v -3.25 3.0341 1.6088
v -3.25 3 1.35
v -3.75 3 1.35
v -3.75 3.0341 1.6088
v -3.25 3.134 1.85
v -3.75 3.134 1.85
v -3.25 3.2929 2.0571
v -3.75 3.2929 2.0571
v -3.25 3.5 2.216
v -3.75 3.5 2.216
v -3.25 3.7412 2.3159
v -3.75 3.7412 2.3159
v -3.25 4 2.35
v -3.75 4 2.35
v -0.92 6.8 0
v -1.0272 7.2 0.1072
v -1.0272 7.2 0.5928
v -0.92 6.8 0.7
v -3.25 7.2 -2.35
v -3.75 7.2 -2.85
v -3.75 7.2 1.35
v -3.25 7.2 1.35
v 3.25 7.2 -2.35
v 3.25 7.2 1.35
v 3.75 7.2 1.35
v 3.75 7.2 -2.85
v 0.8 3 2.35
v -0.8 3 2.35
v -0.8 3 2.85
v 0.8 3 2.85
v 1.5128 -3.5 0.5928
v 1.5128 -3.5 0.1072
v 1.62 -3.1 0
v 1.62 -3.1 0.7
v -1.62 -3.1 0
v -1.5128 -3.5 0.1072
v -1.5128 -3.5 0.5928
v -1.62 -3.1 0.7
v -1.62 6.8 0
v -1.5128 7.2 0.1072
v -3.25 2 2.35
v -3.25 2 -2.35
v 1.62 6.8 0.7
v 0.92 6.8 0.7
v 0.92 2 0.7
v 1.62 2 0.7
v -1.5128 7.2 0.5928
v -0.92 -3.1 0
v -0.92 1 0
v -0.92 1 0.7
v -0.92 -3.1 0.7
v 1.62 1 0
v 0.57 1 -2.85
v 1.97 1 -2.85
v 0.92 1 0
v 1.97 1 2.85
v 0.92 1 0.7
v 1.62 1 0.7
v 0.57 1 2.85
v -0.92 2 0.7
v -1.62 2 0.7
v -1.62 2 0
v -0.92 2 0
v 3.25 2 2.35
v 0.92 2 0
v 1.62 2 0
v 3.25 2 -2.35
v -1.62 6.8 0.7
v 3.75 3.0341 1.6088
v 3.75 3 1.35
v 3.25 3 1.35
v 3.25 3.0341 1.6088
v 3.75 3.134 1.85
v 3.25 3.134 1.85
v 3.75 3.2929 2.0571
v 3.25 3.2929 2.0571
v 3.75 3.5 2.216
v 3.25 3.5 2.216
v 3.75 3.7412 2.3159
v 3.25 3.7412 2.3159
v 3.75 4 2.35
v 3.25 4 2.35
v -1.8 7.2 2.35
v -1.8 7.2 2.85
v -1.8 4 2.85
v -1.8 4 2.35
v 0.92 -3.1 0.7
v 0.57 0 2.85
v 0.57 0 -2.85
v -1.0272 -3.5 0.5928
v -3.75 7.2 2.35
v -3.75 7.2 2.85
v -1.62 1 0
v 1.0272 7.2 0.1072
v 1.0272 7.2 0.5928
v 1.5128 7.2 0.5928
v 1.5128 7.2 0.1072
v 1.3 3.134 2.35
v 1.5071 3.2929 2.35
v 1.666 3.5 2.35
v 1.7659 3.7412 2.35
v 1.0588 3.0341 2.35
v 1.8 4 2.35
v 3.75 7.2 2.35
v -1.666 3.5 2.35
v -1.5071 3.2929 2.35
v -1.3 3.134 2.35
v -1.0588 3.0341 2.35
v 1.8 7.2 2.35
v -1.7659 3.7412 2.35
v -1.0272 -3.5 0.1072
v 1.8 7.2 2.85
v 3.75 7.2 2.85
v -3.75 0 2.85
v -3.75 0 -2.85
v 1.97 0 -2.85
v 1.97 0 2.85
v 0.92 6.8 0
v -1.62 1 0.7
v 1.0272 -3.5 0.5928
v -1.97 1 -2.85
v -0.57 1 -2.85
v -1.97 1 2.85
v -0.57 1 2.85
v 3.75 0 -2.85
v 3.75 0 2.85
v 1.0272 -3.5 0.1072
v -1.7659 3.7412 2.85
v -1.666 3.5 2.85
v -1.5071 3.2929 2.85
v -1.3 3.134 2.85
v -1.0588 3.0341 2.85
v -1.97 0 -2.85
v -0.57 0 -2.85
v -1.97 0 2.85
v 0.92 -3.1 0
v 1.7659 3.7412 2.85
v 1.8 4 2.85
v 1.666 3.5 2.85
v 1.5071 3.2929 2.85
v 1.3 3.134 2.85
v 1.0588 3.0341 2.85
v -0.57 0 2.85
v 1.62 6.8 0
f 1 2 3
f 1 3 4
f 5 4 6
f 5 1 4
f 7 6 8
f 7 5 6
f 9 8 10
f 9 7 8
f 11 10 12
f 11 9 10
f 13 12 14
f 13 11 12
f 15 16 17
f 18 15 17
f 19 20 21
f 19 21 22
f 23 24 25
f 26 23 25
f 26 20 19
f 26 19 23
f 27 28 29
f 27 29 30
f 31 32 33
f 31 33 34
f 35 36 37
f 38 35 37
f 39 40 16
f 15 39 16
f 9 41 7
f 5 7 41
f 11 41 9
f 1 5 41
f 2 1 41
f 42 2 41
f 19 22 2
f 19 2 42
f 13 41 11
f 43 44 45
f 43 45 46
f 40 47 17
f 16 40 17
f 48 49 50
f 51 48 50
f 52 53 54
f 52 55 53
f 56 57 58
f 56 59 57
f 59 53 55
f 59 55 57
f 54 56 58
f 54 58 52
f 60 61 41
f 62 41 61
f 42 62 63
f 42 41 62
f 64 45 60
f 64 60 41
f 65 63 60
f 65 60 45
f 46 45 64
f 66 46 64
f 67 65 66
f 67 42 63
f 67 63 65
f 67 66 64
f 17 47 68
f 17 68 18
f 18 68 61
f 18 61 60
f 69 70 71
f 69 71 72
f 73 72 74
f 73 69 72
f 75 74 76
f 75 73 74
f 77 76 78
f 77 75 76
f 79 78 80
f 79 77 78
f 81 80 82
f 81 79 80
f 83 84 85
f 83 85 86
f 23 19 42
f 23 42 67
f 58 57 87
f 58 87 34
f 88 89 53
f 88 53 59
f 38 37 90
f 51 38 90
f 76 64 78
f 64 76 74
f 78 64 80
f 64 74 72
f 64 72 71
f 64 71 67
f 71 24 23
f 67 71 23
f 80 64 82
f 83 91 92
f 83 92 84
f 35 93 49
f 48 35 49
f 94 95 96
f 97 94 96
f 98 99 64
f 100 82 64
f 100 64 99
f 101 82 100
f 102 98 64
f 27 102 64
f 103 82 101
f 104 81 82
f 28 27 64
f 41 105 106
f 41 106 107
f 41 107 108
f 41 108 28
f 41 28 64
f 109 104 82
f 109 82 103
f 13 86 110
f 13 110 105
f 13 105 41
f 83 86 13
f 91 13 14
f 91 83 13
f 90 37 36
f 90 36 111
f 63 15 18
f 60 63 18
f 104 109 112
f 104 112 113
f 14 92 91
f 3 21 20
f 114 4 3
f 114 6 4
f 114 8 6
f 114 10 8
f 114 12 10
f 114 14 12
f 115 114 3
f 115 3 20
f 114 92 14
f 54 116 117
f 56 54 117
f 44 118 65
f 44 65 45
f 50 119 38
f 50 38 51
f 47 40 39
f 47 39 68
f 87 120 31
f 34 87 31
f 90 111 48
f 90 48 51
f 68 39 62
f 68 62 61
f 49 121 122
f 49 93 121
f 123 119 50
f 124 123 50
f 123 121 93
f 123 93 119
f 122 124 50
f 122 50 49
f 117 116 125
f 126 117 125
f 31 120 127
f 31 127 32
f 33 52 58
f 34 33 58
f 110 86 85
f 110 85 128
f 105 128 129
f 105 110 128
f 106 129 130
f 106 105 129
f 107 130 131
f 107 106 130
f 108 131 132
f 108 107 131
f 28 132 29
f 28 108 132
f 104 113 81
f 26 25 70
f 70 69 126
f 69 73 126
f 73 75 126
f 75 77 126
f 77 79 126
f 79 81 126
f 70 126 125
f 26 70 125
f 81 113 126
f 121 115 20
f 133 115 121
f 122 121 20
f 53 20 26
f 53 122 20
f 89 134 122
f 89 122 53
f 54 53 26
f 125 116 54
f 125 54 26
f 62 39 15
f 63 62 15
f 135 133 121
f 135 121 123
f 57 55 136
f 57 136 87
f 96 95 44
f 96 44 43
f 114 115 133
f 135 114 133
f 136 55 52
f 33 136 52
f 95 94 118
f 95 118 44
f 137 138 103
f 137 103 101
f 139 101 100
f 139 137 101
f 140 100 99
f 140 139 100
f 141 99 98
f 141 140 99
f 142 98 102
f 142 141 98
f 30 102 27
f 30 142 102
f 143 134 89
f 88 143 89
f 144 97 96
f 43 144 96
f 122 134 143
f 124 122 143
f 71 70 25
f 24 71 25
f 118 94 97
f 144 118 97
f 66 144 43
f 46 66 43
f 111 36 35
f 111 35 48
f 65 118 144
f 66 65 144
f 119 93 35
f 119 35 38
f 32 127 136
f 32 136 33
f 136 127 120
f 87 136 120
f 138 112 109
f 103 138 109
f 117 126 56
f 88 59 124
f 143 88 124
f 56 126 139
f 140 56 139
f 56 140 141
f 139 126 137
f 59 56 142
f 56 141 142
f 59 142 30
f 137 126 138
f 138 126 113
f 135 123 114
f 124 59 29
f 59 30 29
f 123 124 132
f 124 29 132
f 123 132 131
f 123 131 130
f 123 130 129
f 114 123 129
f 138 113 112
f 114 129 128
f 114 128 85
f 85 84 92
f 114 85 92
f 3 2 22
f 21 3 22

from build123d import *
from OCP.BRepFilletAPI import BRepFilletAPI_MakeChamfer

# Parameters (mm, degrees)
CROQUIS2_W              = 7.5
CROQUIS2_H              = 5.7
SALIENTE_EXTRUIR1_DEPTH = 7.2
CROQUIS3_W              = 6.5
CROQUIS3_H              = 4.7
CORTAR_EXTRUIR1_DEPTH   = 5.2
CROQUIS4_W              = 3.6
CROQUIS4_H              = 0.5
CORTAR_EXTRUIR2_DEPTH   = 4.2
CROQUIS5_W              = 1
CROQUIS5_H              = 4.2
CORTAR_EXTRUIR3_DEPTH   = 11.780190165
REDONDEO1_R             = 1
CROQUIS7_W              = 1.4
CROQUIS7_H              = 5.7
CORTAR_EXTRUIR4_DEPTH   = 1
SALIENTE_EXTRUIR2_START = -7.2
CROQUIS6_W              = 0.7
CROQUIS6_H              = 0.7
SALIENTE_EXTRUIR2_DEPTH = 10.7
CHAFL_N1_SIZE           = 0.4
CHAFL_N1_SIZE2          = 0.107179677
CHAFL_N2_SIZE           = 0.4
CHAFL_N2_SIZE2          = 0.107179677
CHAFL_N3_SIZE           = 0.4
CHAFL_N3_SIZE2          = 0.107179677


with BuildPart() as part:
    # Croquis2 → Saliente-Extruir1 (new body)
    with BuildSketch(Plane(origin=(0, 0, 0), x_dir=(1, 0, 0), z_dir=(0, 1, 0))):
        Rectangle(CROQUIS2_W, CROQUIS2_H)
    extrude(amount=SALIENTE_EXTRUIR1_DEPTH)

    # Croquis3 → Cortar-Extruir1 (cut)
    with BuildSketch(Plane(origin=(0, 7.2, 0), x_dir=(1, 0, 0), z_dir=(0, 1, 0))):
        Rectangle(CROQUIS3_W, CROQUIS3_H)
    extrude(amount=-CORTAR_EXTRUIR1_DEPTH, mode=Mode.SUBTRACT)

    # Croquis4 → Cortar-Extruir2 (cut)
    with BuildSketch(Plane(origin=(0, 7.2, 0), x_dir=(1, 0, 0), z_dir=(0, 1, 0))):
        with Locations((0, -2.6)):
            Rectangle(CROQUIS4_W, CROQUIS4_H)
    extrude(amount=-CORTAR_EXTRUIR2_DEPTH, mode=Mode.SUBTRACT)

    # Croquis5 → Cortar-Extruir3 (cut, through all)
    with BuildSketch(Plane(origin=(3.75, 0, 0), x_dir=(0, 0, -1), z_dir=(1, 0, 0))):
        with Locations((-1.85, 5.1)):
            Rectangle(CROQUIS5_W, CROQUIS5_H)
    extrude(amount=-CORTAR_EXTRUIR3_DEPTH, mode=Mode.SUBTRACT)

    # Redondeo1
    # the kernel refuses this fillet: 1 mm, written as the material it adds along each edge
    with BuildSketch(Plane(origin=(1.8, 3, 2.85), x_dir=(0, 1, 0), z_dir=(0, 0, -1)), Plane(origin=(3.75, 3, 2.35), x_dir=(0, 0, -1), z_dir=(-1, 0, 0))) as redondeo1_piece_1:
        with BuildLine():
            CenterArc((REDONDEO1_R, -REDONDEO1_R), REDONDEO1_R, 90, 90)
            Line((0, -REDONDEO1_R), (0, 0))
            Line((0, 0), (REDONDEO1_R, 0))
        make_face()
    extrude(amount=0.5)
    with BuildSketch(Plane(origin=(-1.8, 3, 2.35), x_dir=(1, 0, 0), z_dir=(0, 0, 1)), Plane(origin=(-3.25, 3, 2.35), x_dir=(0, 1, 0), z_dir=(-1, 0, 0))) as redondeo1_piece_2:
        with BuildLine():
            CenterArc((REDONDEO1_R, REDONDEO1_R), REDONDEO1_R, 180, 90)
            Line((0, REDONDEO1_R), (0, 0))
            Line((0, 0), (REDONDEO1_R, 0))
        make_face()
    extrude(amount=0.5)

    # Croquis7 → Cortar-Extruir4 (cut)
    with BuildSketch(Plane.XZ):
        with Locations((-1.27, 0)):
            Rectangle(CROQUIS7_W, CROQUIS7_H)
        with Locations((1.27, 0)):
            Rectangle(CROQUIS7_W, CROQUIS7_H)
    extrude(amount=-CORTAR_EXTRUIR4_DEPTH, mode=Mode.SUBTRACT)

    # Croquis6 → Saliente-Extruir2 (add)
    with BuildSketch(Plane.XZ.offset(SALIENTE_EXTRUIR2_START)):
        with Locations((-1.27, 0.35)):
            Rectangle(CROQUIS6_W, CROQUIS6_H)
        with Locations((1.27, 0.35)):
            Rectangle(CROQUIS6_W, CROQUIS6_H)
    extrude(amount=SALIENTE_EXTRUIR2_DEPTH)

    # Chaflán1: one chamfer whose edges measure the first distance from different faces: ONE call of the kernel's chamfer builder (chamfer() names one face for all edges)
    chafl_n1_edges_1 = [part.edges().sort_by_distance(p)[0] for p in [
        (-0.92, -3.5, 0.35),
    ]]
    chafl_n1_side_1 = [part.faces().sort_by_distance(p)[0] for p in [
        (-0.92, -1.25, 0.35),
    ]]
    chafl_n1_edges_2 = [part.edges().sort_by_distance(p)[0] for p in [
        (-1.27, -3.5, 0.7),
    ]]
    chafl_n1_side_2 = [part.faces().sort_by_distance(p)[0] for p in [
        (-1.27, -1.25, 0.7),
    ]]
    chafl_n1_edges_3 = [part.edges().sort_by_distance(p)[0] for p in [
        (-1.62, -3.5, 0.35),
    ]]
    chafl_n1_side_3 = [part.faces().sort_by_distance(p)[0] for p in [
        (-1.62, -1.25, 0.35),
    ]]
    chafl_n1_edges_4 = [part.edges().sort_by_distance(p)[0] for p in [
        (-1.27, -3.5, 0),
    ]]
    chafl_n1_side_4 = [part.faces().sort_by_distance(p)[0] for p in [
        (-1.27, -1.25, 0),
    ]]
    chafl_n1_edges_5 = [part.edges().sort_by_distance(p)[0] for p in [
        (1.62, -3.5, 0.35),
    ]]
    chafl_n1_side_5 = [part.faces().sort_by_distance(p)[0] for p in [
        (1.62, -1.25, 0.35),
    ]]
    chafl_n1_edges_6 = [part.edges().sort_by_distance(p)[0] for p in [
        (1.27, -3.5, 0.7),
    ]]
    chafl_n1_side_6 = [part.faces().sort_by_distance(p)[0] for p in [
        (1.27, -1.25, 0.7),
    ]]
    chafl_n1_edges_7 = [part.edges().sort_by_distance(p)[0] for p in [
        (0.92, -3.5, 0.35),
    ]]
    chafl_n1_side_7 = [part.faces().sort_by_distance(p)[0] for p in [
        (0.92, -1.25, 0.35),
    ]]
    chafl_n1_edges_8 = [part.edges().sort_by_distance(p)[0] for p in [
        (1.27, -3.5, 0),
    ]]
    chafl_n1_side_8 = [part.faces().sort_by_distance(p)[0] for p in [
        (1.27, -1.25, 0),
    ]]
    chafl_n1 = BRepFilletAPI_MakeChamfer(part.part.solid().wrapped)
    for e in chafl_n1_edges_1:
        chafl_n1.Add(CHAFL_N1_SIZE, CHAFL_N1_SIZE2, e.wrapped, chafl_n1_side_1[0].wrapped)  # the first distance lies on this face
    for e in chafl_n1_edges_2:
        chafl_n1.Add(CHAFL_N1_SIZE, CHAFL_N1_SIZE2, e.wrapped, chafl_n1_side_2[0].wrapped)  # the first distance lies on this face
    for e in chafl_n1_edges_3:
        chafl_n1.Add(CHAFL_N1_SIZE, CHAFL_N1_SIZE2, e.wrapped, chafl_n1_side_3[0].wrapped)  # the first distance lies on this face
    for e in chafl_n1_edges_4:
        chafl_n1.Add(CHAFL_N1_SIZE, CHAFL_N1_SIZE2, e.wrapped, chafl_n1_side_4[0].wrapped)  # the first distance lies on this face
    for e in chafl_n1_edges_5:
        chafl_n1.Add(CHAFL_N1_SIZE, CHAFL_N1_SIZE2, e.wrapped, chafl_n1_side_5[0].wrapped)  # the first distance lies on this face
    for e in chafl_n1_edges_6:
        chafl_n1.Add(CHAFL_N1_SIZE, CHAFL_N1_SIZE2, e.wrapped, chafl_n1_side_6[0].wrapped)  # the first distance lies on this face
    for e in chafl_n1_edges_7:
        chafl_n1.Add(CHAFL_N1_SIZE, CHAFL_N1_SIZE2, e.wrapped, chafl_n1_side_7[0].wrapped)  # the first distance lies on this face
    for e in chafl_n1_edges_8:
        chafl_n1.Add(CHAFL_N1_SIZE, CHAFL_N1_SIZE2, e.wrapped, chafl_n1_side_8[0].wrapped)  # the first distance lies on this face
    add(Compound.cast(chafl_n1.Shape()), mode=Mode.REPLACE)

    # Chaflán2: one chamfer whose edges measure the first distance from different faces: ONE call of the kernel's chamfer builder (chamfer() names one face for all edges)
    chafl_n2_edges_1 = [part.edges().sort_by_distance(p)[0] for p in [
        (-1.27, 7.2, 0.7),
    ]]
    chafl_n2_side_1 = [part.faces().sort_by_distance(p)[0] for p in [
        (-1.27, 4.6, 0.7),
    ]]
    chafl_n2_edges_2 = [part.edges().sort_by_distance(p)[0] for p in [
        (-1.62, 7.2, 0.35),
    ]]
    chafl_n2_side_2 = [part.faces().sort_by_distance(p)[0] for p in [
        (-1.62, 4.6, 0.35),
    ]]
    chafl_n2_edges_3 = [part.edges().sort_by_distance(p)[0] for p in [
        (-1.27, 7.2, 0),
    ]]
    chafl_n2_side_3 = [part.faces().sort_by_distance(p)[0] for p in [
        (-1.27, 4.6, 0),
    ]]
    chafl_n2_edges_4 = [part.edges().sort_by_distance(p)[0] for p in [
        (-0.92, 7.2, 0.35),
    ]]
    chafl_n2_side_4 = [part.faces().sort_by_distance(p)[0] for p in [
        (-0.92, 4.6, 0.35),
    ]]
    chafl_n2 = BRepFilletAPI_MakeChamfer(part.part.solid().wrapped)
    for e in chafl_n2_edges_1:
        chafl_n2.Add(CHAFL_N2_SIZE, CHAFL_N2_SIZE2, e.wrapped, chafl_n2_side_1[0].wrapped)  # the first distance lies on this face
    for e in chafl_n2_edges_2:
        chafl_n2.Add(CHAFL_N2_SIZE, CHAFL_N2_SIZE2, e.wrapped, chafl_n2_side_2[0].wrapped)  # the first distance lies on this face
    for e in chafl_n2_edges_3:
        chafl_n2.Add(CHAFL_N2_SIZE, CHAFL_N2_SIZE2, e.wrapped, chafl_n2_side_3[0].wrapped)  # the first distance lies on this face
    for e in chafl_n2_edges_4:
        chafl_n2.Add(CHAFL_N2_SIZE, CHAFL_N2_SIZE2, e.wrapped, chafl_n2_side_4[0].wrapped)  # the first distance lies on this face
    add(Compound.cast(chafl_n2.Shape()), mode=Mode.REPLACE)

    # Chaflán3: one chamfer whose edges measure the first distance from different faces: ONE call of the kernel's chamfer builder (chamfer() names one face for all edges)
    chafl_n3_edges_1 = [part.edges().sort_by_distance(p)[0] for p in [
        (1.27, 7.2, 0.7),
    ]]
    chafl_n3_side_1 = [part.faces().sort_by_distance(p)[0] for p in [
        (1.27, 4.6, 0.7),
    ]]
    chafl_n3_edges_2 = [part.edges().sort_by_distance(p)[0] for p in [
        (0.92, 7.2, 0.35),
    ]]
    chafl_n3_side_2 = [part.faces().sort_by_distance(p)[0] for p in [
        (0.92, 4.6, 0.35),
    ]]
    chafl_n3_edges_3 = [part.edges().sort_by_distance(p)[0] for p in [
        (1.27, 7.2, 0),
    ]]
    chafl_n3_side_3 = [part.faces().sort_by_distance(p)[0] for p in [
        (1.27, 4.6, 0),
    ]]
    chafl_n3_edges_4 = [part.edges().sort_by_distance(p)[0] for p in [
        (1.62, 7.2, 0.35),
    ]]
    chafl_n3_side_4 = [part.faces().sort_by_distance(p)[0] for p in [
        (1.62, 4.6, 0.35),
    ]]
    chafl_n3 = BRepFilletAPI_MakeChamfer(part.part.solid().wrapped)
    for e in chafl_n3_edges_1:
        chafl_n3.Add(CHAFL_N3_SIZE, CHAFL_N3_SIZE2, e.wrapped, chafl_n3_side_1[0].wrapped)  # the first distance lies on this face
    for e in chafl_n3_edges_2:
        chafl_n3.Add(CHAFL_N3_SIZE, CHAFL_N3_SIZE2, e.wrapped, chafl_n3_side_2[0].wrapped)  # the first distance lies on this face
    for e in chafl_n3_edges_3:
        chafl_n3.Add(CHAFL_N3_SIZE, CHAFL_N3_SIZE2, e.wrapped, chafl_n3_side_3[0].wrapped)  # the first distance lies on this face
    for e in chafl_n3_edges_4:
        chafl_n3.Add(CHAFL_N3_SIZE, CHAFL_N3_SIZE2, e.wrapped, chafl_n3_side_4[0].wrapped)  # the first distance lies on this face
    add(Compound.cast(chafl_n3.Shape()), mode=Mode.REPLACE)


solid = part.part
